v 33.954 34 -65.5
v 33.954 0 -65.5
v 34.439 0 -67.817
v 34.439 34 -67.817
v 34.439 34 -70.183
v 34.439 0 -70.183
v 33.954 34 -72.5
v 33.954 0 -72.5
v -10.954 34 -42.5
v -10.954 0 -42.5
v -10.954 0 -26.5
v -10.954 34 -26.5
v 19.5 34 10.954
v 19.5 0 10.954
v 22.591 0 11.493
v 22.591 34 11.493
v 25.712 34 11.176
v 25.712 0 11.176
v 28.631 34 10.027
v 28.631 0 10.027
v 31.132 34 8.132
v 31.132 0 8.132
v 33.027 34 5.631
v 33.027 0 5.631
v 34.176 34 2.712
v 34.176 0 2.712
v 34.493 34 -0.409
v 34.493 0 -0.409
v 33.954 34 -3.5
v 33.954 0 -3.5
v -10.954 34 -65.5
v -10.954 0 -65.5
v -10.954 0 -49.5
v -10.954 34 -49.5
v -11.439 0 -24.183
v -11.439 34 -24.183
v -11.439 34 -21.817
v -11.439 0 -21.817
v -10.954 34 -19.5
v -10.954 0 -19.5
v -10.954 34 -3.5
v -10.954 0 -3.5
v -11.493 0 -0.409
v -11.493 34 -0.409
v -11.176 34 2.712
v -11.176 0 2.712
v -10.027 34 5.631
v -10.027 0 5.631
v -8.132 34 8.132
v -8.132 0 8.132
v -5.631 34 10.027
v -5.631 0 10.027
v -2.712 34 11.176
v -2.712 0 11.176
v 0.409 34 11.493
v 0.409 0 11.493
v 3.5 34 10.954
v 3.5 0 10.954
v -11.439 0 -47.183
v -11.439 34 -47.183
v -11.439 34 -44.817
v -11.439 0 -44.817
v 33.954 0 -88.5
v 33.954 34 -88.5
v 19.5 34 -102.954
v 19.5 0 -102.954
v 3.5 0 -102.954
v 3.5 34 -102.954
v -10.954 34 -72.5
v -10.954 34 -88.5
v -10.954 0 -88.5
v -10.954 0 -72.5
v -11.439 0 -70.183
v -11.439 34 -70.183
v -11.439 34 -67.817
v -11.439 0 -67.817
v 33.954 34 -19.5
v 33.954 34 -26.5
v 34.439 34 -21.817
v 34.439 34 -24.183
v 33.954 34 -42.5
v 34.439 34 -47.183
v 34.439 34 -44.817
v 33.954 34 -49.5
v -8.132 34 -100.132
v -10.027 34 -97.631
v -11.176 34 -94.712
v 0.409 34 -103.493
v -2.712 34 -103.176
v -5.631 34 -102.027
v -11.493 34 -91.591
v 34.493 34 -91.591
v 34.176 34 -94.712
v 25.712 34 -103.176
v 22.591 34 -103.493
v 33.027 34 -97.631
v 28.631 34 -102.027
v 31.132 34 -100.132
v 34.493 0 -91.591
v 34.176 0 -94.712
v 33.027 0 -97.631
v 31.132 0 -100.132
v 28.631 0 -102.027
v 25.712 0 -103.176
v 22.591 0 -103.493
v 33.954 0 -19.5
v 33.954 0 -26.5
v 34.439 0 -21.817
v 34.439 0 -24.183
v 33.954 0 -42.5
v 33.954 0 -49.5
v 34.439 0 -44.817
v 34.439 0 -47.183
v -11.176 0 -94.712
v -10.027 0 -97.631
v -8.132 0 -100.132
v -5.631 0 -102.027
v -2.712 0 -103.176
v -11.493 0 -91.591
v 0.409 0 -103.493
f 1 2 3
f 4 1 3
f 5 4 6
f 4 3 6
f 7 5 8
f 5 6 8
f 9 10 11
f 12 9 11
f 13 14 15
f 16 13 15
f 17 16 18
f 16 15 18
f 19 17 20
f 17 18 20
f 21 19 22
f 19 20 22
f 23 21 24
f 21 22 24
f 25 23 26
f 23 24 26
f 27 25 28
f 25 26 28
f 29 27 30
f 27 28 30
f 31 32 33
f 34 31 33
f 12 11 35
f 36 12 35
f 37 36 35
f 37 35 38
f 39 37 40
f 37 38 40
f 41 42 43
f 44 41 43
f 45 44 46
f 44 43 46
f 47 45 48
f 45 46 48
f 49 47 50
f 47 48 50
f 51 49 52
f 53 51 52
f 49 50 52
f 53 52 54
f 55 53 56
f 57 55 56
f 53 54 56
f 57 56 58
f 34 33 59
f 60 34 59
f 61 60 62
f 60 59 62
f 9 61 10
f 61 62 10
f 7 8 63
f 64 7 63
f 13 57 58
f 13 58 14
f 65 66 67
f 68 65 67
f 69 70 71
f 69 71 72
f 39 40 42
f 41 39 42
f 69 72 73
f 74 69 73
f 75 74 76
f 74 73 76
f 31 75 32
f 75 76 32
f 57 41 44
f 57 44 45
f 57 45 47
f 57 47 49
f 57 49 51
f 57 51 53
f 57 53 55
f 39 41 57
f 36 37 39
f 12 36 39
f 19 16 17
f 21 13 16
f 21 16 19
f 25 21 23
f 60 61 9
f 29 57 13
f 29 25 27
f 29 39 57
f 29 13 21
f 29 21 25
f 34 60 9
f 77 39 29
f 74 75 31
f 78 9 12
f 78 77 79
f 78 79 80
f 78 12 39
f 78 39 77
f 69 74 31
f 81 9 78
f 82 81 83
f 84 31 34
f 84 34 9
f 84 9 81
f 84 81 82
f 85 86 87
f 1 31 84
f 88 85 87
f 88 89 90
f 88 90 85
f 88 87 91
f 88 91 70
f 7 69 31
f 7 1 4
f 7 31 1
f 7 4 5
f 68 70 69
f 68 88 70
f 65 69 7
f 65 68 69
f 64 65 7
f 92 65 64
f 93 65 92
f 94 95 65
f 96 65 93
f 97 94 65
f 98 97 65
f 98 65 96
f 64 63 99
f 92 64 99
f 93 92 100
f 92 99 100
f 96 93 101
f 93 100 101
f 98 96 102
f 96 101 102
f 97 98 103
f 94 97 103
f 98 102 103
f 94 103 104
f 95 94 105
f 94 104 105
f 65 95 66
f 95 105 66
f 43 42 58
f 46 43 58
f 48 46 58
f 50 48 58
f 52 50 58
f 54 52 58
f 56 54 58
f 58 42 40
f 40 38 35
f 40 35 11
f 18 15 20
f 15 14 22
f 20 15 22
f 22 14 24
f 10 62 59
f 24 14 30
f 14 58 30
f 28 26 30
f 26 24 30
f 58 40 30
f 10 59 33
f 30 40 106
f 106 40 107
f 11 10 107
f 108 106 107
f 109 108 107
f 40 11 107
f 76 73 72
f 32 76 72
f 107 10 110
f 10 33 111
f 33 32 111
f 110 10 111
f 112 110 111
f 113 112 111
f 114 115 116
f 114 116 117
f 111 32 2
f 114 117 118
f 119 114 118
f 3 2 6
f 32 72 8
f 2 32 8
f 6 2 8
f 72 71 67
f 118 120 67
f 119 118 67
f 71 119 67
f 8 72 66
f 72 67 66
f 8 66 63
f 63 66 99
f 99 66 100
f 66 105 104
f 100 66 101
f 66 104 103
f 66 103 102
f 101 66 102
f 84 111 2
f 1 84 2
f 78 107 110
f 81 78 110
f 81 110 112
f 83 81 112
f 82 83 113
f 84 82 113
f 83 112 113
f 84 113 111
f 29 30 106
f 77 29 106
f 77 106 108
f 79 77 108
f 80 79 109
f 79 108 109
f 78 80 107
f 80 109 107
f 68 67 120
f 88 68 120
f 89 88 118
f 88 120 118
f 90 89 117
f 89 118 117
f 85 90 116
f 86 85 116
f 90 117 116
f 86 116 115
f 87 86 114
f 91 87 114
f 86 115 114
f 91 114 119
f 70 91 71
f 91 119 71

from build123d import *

# Parameters (mm, degrees)
BOSS_EXTRUDE1_DEPTH = 34
BOSS_EXTRUDE2_DEPTH = 34


with BuildPart() as part:
    # Sketch1 → Boss-Extrude1 (new body)
    with BuildSketch(Plane(origin=(0, 0, 0), x_dir=(1, 0, 0), z_dir=(0, 1, 0))):
        with BuildLine():
            ThreePointArc((0, 11.5), (-8.131727984, -8.131727984), (11.5, 0))
            ThreePointArc((11.5, 0), (31.131727984, -8.131727984), (23, 11.5))
            ThreePointArc((23, 11.5), (34.5, 23), (23, 34.5))
            ThreePointArc((23, 34.5), (34.5, 46), (23, 57.5))
            ThreePointArc((23, 57.5), (34.5, 69), (23, 80.5))
            ThreePointArc((23, 80.5), (31.131727984, 100.131727984), (11.5, 92))
            ThreePointArc((11.5, 92), (-8.131727984, 100.131727984), (0, 80.5))
            ThreePointArc((0, 80.5), (-11.5, 69), (0, 57.5))
            ThreePointArc((0, 57.5), (-11.5, 46), (0, 34.5))
            ThreePointArc((0, 34.5), (-11.5, 23), (0, 11.5))
        make_face()
    extrude(amount=BOSS_EXTRUDE1_DEPTH)

    # Sketch2 → Boss-Extrude2 (add)
    with BuildSketch(Plane(origin=(0, 34, 0), x_dir=(1, 0, 0), z_dir=(0, 1, 0))):
        Polygon((-10.95445115, 88.5), (-10.95445115, 72.5), (-10.95445115, 3.5), (3.5, -10.95445115), (19.5, -10.95445115), (33.95445115, -3.5), (33.95445115, 88.5), (19.5, 102.95445115), (3.5, 102.95445115), align=None)
    extrude(amount=-BOSS_EXTRUDE2_DEPTH)


solid = part.part
